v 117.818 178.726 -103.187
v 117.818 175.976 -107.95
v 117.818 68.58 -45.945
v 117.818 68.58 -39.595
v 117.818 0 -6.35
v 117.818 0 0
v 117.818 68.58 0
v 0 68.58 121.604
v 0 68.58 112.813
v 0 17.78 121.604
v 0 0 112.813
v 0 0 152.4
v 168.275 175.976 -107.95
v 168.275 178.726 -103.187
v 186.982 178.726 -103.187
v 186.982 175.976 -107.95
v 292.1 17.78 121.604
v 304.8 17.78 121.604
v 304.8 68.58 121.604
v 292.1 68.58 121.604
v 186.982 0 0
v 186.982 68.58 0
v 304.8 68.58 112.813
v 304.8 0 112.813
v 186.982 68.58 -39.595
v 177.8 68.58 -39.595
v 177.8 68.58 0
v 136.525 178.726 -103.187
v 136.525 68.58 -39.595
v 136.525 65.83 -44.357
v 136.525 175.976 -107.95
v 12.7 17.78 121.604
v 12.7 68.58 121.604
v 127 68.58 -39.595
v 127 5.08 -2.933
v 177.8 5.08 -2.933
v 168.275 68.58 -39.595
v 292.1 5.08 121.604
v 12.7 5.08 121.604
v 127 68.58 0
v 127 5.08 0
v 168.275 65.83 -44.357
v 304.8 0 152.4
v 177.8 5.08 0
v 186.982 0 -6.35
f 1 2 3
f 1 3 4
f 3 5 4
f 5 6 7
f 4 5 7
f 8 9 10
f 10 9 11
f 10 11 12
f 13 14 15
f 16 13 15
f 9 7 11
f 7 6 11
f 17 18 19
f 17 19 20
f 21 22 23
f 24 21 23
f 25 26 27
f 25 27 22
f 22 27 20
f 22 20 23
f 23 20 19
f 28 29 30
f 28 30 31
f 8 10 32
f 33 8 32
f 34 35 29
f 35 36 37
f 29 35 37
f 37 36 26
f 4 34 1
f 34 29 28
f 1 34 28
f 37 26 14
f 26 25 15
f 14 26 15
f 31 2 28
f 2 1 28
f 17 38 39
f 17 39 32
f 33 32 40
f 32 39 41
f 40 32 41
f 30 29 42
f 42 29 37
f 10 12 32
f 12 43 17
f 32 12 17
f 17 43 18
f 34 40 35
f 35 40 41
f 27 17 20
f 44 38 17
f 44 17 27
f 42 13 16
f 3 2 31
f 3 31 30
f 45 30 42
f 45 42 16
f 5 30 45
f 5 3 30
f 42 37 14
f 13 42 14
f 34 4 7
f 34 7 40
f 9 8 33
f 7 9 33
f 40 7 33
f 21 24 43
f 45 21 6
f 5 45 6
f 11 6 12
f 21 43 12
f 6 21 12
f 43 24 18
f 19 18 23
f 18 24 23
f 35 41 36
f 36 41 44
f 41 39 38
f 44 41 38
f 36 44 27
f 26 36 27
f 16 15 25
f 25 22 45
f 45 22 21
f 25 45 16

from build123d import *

# Parameters (mm, degrees)
SKETCH2_W           = 304.8
SKETCH2_H           = 17.78
BOSS_EXTRUDE1_DEPTH = 152.4
SKETCH3_W           = 121.604136641
SKETCH3_H           = 12.7
CUT_EXTRUDE1_DEPTH  = 305.8
CUT_EXTRUDE2_DEPTH  = 203.2
BOSS_EXTRUDE6_DEPTH = 63.5
BOSS_EXTRUDE8_DEPTH = 76.2
BOSS_EXTRUDE9_DEPTH = 69.163311
CUT_EXTRUDE4_REACH  = 230.6
SKETCH14_W          = 31.75
SKETCH14_H          = 203.2
CUT_EXTRUDE5_DEPTH  = 116.484487595
SKETCH15_W          = 69.163311332
SKETCH15_H          = 50.8
CUT_EXTRUDE6_DEPTH  = 12.7


with BuildPart() as part:
    # Sketch2 → Boss-Extrude1 (new body)
    with BuildSketch(Plane.XY):
        with Locations((152.4, 8.89)):
            Rectangle(SKETCH2_W, SKETCH2_H)
    extrude(amount=BOSS_EXTRUDE1_DEPTH)

    # Sketch3 → Cut-Extrude1 (cut, through all)
    with BuildSketch(Plane(origin=(304.8, 0, 0), x_dir=(0, 0, -1), z_dir=(1, 0, 0))):
        Polygon((-152.4, 17.78), (-152.4, 0), (-121.604136641, 17.78), align=None)
        with Locations((-60.802068321, 11.43)):
            Rectangle(SKETCH3_W, SKETCH3_H)
    extrude(amount=-CUT_EXTRUDE1_DEPTH, mode=Mode.SUBTRACT)

    # Sketch4 → Cut-Extrude2 (cut)
    with BuildSketch(Plane(origin=(0, 5.08, 0), x_dir=(1, 0, 0), z_dir=(0, 1, 0))):
        Polygon((0, 0), (0, -112.812583018), (117.818344334, 0), align=None)
        Polygon((304.8, 0), (186.981655666, 0), (304.8, -112.812583018), align=None)
    extrude(amount=-CUT_EXTRUDE2_DEPTH, mode=Mode.SUBTRACT)

    # Sketch5 → Boss-Extrude6 (add)
    with BuildSketch(Plane(origin=(0, 5.08, 0), x_dir=(1, 0, 0), z_dir=(0, 1, 0))):
        Polygon((127, 0), (117.818344334, 0), (0, -112.812583018), (0, -121.604136641), (12.7, -121.604136641), align=None)
        Polygon((177.8, 0), (186.981655666, 0), (304.8, -112.812583018), (304.8, -121.604136641), (292.1, -121.604136641), align=None)
    extrude(amount=BOSS_EXTRUDE6_DEPTH)

    # Sketch8 → Boss-Extrude8 (add)
    with BuildSketch(Plane(origin=(0, 0, 0), x_dir=(-1, 0, 0), z_dir=(0, 0, -1))):
        Polygon((-186.981655666, 68.58), (-186.981655666, 0), (-117.818344334, 0), (-117.818344334, 68.58), (-127, 68.58), (-127, 5.08), (-177.8, 5.08), (-177.8, 68.58), align=None)
    extrude(amount=BOSS_EXTRUDE8_DEPTH)

    # Sketch10 → Boss-Extrude9 (add)
    with BuildSketch(Plane(origin=(186.981655666, 0, 0), x_dir=(0, 0, -1), z_dir=(1, 0, 0))):
        Polygon((6.35, 0), (0, 0), (127, 219.970452561), (133.35, 219.970452561), align=None)
    extrude(amount=-BOSS_EXTRUDE9_DEPTH)

    # Cut-Extrude4: up to this face of the body (flat: up to its plane)
    cut_extrude4_end = Plane(part.part.faces().sort_by_distance((152.400000127, 118.969659324, -75.037164836))[0])
    # Sketch12 → Cut-Extrude4 (cut, up to the picked face)
    with BuildSketch(Plane(origin=(0, 0, -76.2), x_dir=(-1, 0, 0), z_dir=(0, 0, -1)), mode=Mode.PRIVATE) as cut_extrude4_sk1:
        Polygon((-186.981655666, 0), (-186.981655666, 68.58), (-177.8, 68.58), (-177.8, 5.08), (-127, 5.08), (-127, 68.58), (-117.818344334, 68.58), (-117.818344334, 0), align=None)
    cut_extrude4_tool1 = split(extrude(cut_extrude4_sk1.sketch, amount=-CUT_EXTRUDE4_REACH, mode=Mode.PRIVATE), bisect_by=cut_extrude4_end, keep=Keep.BOTH, mode=Mode.PRIVATE)
    add(cut_extrude4_tool1.solids().sort_by_distance((186.007655, 34.29, -76.2))[0], mode=Mode.SUBTRACT)

    # Sketch14 → Cut-Extrude5 (cut, through all)
    with BuildSketch(Plane(origin=(0, 0, 0), x_dir=(1, 0, 0), z_dir=(0, 0.5, 0.866025404))):
        with Locations((152.4, 180.789362922)):
            Rectangle(SKETCH14_W, SKETCH14_H)
    extrude(amount=-CUT_EXTRUDE5_DEPTH, mode=Mode.SUBTRACT)

    # Sketch15 → Cut-Extrude6 (cut)
    with BuildSketch(Plane(origin=(0, 0, 0), x_dir=(1, 0, 0), z_dir=(0, 0.5, 0.866025404))):
        with Locations((152.4, 231.775)):
            Rectangle(SKETCH15_W, SKETCH15_H)
    extrude(amount=-CUT_EXTRUDE6_DEPTH, mode=Mode.SUBTRACT)


solid = part.part
